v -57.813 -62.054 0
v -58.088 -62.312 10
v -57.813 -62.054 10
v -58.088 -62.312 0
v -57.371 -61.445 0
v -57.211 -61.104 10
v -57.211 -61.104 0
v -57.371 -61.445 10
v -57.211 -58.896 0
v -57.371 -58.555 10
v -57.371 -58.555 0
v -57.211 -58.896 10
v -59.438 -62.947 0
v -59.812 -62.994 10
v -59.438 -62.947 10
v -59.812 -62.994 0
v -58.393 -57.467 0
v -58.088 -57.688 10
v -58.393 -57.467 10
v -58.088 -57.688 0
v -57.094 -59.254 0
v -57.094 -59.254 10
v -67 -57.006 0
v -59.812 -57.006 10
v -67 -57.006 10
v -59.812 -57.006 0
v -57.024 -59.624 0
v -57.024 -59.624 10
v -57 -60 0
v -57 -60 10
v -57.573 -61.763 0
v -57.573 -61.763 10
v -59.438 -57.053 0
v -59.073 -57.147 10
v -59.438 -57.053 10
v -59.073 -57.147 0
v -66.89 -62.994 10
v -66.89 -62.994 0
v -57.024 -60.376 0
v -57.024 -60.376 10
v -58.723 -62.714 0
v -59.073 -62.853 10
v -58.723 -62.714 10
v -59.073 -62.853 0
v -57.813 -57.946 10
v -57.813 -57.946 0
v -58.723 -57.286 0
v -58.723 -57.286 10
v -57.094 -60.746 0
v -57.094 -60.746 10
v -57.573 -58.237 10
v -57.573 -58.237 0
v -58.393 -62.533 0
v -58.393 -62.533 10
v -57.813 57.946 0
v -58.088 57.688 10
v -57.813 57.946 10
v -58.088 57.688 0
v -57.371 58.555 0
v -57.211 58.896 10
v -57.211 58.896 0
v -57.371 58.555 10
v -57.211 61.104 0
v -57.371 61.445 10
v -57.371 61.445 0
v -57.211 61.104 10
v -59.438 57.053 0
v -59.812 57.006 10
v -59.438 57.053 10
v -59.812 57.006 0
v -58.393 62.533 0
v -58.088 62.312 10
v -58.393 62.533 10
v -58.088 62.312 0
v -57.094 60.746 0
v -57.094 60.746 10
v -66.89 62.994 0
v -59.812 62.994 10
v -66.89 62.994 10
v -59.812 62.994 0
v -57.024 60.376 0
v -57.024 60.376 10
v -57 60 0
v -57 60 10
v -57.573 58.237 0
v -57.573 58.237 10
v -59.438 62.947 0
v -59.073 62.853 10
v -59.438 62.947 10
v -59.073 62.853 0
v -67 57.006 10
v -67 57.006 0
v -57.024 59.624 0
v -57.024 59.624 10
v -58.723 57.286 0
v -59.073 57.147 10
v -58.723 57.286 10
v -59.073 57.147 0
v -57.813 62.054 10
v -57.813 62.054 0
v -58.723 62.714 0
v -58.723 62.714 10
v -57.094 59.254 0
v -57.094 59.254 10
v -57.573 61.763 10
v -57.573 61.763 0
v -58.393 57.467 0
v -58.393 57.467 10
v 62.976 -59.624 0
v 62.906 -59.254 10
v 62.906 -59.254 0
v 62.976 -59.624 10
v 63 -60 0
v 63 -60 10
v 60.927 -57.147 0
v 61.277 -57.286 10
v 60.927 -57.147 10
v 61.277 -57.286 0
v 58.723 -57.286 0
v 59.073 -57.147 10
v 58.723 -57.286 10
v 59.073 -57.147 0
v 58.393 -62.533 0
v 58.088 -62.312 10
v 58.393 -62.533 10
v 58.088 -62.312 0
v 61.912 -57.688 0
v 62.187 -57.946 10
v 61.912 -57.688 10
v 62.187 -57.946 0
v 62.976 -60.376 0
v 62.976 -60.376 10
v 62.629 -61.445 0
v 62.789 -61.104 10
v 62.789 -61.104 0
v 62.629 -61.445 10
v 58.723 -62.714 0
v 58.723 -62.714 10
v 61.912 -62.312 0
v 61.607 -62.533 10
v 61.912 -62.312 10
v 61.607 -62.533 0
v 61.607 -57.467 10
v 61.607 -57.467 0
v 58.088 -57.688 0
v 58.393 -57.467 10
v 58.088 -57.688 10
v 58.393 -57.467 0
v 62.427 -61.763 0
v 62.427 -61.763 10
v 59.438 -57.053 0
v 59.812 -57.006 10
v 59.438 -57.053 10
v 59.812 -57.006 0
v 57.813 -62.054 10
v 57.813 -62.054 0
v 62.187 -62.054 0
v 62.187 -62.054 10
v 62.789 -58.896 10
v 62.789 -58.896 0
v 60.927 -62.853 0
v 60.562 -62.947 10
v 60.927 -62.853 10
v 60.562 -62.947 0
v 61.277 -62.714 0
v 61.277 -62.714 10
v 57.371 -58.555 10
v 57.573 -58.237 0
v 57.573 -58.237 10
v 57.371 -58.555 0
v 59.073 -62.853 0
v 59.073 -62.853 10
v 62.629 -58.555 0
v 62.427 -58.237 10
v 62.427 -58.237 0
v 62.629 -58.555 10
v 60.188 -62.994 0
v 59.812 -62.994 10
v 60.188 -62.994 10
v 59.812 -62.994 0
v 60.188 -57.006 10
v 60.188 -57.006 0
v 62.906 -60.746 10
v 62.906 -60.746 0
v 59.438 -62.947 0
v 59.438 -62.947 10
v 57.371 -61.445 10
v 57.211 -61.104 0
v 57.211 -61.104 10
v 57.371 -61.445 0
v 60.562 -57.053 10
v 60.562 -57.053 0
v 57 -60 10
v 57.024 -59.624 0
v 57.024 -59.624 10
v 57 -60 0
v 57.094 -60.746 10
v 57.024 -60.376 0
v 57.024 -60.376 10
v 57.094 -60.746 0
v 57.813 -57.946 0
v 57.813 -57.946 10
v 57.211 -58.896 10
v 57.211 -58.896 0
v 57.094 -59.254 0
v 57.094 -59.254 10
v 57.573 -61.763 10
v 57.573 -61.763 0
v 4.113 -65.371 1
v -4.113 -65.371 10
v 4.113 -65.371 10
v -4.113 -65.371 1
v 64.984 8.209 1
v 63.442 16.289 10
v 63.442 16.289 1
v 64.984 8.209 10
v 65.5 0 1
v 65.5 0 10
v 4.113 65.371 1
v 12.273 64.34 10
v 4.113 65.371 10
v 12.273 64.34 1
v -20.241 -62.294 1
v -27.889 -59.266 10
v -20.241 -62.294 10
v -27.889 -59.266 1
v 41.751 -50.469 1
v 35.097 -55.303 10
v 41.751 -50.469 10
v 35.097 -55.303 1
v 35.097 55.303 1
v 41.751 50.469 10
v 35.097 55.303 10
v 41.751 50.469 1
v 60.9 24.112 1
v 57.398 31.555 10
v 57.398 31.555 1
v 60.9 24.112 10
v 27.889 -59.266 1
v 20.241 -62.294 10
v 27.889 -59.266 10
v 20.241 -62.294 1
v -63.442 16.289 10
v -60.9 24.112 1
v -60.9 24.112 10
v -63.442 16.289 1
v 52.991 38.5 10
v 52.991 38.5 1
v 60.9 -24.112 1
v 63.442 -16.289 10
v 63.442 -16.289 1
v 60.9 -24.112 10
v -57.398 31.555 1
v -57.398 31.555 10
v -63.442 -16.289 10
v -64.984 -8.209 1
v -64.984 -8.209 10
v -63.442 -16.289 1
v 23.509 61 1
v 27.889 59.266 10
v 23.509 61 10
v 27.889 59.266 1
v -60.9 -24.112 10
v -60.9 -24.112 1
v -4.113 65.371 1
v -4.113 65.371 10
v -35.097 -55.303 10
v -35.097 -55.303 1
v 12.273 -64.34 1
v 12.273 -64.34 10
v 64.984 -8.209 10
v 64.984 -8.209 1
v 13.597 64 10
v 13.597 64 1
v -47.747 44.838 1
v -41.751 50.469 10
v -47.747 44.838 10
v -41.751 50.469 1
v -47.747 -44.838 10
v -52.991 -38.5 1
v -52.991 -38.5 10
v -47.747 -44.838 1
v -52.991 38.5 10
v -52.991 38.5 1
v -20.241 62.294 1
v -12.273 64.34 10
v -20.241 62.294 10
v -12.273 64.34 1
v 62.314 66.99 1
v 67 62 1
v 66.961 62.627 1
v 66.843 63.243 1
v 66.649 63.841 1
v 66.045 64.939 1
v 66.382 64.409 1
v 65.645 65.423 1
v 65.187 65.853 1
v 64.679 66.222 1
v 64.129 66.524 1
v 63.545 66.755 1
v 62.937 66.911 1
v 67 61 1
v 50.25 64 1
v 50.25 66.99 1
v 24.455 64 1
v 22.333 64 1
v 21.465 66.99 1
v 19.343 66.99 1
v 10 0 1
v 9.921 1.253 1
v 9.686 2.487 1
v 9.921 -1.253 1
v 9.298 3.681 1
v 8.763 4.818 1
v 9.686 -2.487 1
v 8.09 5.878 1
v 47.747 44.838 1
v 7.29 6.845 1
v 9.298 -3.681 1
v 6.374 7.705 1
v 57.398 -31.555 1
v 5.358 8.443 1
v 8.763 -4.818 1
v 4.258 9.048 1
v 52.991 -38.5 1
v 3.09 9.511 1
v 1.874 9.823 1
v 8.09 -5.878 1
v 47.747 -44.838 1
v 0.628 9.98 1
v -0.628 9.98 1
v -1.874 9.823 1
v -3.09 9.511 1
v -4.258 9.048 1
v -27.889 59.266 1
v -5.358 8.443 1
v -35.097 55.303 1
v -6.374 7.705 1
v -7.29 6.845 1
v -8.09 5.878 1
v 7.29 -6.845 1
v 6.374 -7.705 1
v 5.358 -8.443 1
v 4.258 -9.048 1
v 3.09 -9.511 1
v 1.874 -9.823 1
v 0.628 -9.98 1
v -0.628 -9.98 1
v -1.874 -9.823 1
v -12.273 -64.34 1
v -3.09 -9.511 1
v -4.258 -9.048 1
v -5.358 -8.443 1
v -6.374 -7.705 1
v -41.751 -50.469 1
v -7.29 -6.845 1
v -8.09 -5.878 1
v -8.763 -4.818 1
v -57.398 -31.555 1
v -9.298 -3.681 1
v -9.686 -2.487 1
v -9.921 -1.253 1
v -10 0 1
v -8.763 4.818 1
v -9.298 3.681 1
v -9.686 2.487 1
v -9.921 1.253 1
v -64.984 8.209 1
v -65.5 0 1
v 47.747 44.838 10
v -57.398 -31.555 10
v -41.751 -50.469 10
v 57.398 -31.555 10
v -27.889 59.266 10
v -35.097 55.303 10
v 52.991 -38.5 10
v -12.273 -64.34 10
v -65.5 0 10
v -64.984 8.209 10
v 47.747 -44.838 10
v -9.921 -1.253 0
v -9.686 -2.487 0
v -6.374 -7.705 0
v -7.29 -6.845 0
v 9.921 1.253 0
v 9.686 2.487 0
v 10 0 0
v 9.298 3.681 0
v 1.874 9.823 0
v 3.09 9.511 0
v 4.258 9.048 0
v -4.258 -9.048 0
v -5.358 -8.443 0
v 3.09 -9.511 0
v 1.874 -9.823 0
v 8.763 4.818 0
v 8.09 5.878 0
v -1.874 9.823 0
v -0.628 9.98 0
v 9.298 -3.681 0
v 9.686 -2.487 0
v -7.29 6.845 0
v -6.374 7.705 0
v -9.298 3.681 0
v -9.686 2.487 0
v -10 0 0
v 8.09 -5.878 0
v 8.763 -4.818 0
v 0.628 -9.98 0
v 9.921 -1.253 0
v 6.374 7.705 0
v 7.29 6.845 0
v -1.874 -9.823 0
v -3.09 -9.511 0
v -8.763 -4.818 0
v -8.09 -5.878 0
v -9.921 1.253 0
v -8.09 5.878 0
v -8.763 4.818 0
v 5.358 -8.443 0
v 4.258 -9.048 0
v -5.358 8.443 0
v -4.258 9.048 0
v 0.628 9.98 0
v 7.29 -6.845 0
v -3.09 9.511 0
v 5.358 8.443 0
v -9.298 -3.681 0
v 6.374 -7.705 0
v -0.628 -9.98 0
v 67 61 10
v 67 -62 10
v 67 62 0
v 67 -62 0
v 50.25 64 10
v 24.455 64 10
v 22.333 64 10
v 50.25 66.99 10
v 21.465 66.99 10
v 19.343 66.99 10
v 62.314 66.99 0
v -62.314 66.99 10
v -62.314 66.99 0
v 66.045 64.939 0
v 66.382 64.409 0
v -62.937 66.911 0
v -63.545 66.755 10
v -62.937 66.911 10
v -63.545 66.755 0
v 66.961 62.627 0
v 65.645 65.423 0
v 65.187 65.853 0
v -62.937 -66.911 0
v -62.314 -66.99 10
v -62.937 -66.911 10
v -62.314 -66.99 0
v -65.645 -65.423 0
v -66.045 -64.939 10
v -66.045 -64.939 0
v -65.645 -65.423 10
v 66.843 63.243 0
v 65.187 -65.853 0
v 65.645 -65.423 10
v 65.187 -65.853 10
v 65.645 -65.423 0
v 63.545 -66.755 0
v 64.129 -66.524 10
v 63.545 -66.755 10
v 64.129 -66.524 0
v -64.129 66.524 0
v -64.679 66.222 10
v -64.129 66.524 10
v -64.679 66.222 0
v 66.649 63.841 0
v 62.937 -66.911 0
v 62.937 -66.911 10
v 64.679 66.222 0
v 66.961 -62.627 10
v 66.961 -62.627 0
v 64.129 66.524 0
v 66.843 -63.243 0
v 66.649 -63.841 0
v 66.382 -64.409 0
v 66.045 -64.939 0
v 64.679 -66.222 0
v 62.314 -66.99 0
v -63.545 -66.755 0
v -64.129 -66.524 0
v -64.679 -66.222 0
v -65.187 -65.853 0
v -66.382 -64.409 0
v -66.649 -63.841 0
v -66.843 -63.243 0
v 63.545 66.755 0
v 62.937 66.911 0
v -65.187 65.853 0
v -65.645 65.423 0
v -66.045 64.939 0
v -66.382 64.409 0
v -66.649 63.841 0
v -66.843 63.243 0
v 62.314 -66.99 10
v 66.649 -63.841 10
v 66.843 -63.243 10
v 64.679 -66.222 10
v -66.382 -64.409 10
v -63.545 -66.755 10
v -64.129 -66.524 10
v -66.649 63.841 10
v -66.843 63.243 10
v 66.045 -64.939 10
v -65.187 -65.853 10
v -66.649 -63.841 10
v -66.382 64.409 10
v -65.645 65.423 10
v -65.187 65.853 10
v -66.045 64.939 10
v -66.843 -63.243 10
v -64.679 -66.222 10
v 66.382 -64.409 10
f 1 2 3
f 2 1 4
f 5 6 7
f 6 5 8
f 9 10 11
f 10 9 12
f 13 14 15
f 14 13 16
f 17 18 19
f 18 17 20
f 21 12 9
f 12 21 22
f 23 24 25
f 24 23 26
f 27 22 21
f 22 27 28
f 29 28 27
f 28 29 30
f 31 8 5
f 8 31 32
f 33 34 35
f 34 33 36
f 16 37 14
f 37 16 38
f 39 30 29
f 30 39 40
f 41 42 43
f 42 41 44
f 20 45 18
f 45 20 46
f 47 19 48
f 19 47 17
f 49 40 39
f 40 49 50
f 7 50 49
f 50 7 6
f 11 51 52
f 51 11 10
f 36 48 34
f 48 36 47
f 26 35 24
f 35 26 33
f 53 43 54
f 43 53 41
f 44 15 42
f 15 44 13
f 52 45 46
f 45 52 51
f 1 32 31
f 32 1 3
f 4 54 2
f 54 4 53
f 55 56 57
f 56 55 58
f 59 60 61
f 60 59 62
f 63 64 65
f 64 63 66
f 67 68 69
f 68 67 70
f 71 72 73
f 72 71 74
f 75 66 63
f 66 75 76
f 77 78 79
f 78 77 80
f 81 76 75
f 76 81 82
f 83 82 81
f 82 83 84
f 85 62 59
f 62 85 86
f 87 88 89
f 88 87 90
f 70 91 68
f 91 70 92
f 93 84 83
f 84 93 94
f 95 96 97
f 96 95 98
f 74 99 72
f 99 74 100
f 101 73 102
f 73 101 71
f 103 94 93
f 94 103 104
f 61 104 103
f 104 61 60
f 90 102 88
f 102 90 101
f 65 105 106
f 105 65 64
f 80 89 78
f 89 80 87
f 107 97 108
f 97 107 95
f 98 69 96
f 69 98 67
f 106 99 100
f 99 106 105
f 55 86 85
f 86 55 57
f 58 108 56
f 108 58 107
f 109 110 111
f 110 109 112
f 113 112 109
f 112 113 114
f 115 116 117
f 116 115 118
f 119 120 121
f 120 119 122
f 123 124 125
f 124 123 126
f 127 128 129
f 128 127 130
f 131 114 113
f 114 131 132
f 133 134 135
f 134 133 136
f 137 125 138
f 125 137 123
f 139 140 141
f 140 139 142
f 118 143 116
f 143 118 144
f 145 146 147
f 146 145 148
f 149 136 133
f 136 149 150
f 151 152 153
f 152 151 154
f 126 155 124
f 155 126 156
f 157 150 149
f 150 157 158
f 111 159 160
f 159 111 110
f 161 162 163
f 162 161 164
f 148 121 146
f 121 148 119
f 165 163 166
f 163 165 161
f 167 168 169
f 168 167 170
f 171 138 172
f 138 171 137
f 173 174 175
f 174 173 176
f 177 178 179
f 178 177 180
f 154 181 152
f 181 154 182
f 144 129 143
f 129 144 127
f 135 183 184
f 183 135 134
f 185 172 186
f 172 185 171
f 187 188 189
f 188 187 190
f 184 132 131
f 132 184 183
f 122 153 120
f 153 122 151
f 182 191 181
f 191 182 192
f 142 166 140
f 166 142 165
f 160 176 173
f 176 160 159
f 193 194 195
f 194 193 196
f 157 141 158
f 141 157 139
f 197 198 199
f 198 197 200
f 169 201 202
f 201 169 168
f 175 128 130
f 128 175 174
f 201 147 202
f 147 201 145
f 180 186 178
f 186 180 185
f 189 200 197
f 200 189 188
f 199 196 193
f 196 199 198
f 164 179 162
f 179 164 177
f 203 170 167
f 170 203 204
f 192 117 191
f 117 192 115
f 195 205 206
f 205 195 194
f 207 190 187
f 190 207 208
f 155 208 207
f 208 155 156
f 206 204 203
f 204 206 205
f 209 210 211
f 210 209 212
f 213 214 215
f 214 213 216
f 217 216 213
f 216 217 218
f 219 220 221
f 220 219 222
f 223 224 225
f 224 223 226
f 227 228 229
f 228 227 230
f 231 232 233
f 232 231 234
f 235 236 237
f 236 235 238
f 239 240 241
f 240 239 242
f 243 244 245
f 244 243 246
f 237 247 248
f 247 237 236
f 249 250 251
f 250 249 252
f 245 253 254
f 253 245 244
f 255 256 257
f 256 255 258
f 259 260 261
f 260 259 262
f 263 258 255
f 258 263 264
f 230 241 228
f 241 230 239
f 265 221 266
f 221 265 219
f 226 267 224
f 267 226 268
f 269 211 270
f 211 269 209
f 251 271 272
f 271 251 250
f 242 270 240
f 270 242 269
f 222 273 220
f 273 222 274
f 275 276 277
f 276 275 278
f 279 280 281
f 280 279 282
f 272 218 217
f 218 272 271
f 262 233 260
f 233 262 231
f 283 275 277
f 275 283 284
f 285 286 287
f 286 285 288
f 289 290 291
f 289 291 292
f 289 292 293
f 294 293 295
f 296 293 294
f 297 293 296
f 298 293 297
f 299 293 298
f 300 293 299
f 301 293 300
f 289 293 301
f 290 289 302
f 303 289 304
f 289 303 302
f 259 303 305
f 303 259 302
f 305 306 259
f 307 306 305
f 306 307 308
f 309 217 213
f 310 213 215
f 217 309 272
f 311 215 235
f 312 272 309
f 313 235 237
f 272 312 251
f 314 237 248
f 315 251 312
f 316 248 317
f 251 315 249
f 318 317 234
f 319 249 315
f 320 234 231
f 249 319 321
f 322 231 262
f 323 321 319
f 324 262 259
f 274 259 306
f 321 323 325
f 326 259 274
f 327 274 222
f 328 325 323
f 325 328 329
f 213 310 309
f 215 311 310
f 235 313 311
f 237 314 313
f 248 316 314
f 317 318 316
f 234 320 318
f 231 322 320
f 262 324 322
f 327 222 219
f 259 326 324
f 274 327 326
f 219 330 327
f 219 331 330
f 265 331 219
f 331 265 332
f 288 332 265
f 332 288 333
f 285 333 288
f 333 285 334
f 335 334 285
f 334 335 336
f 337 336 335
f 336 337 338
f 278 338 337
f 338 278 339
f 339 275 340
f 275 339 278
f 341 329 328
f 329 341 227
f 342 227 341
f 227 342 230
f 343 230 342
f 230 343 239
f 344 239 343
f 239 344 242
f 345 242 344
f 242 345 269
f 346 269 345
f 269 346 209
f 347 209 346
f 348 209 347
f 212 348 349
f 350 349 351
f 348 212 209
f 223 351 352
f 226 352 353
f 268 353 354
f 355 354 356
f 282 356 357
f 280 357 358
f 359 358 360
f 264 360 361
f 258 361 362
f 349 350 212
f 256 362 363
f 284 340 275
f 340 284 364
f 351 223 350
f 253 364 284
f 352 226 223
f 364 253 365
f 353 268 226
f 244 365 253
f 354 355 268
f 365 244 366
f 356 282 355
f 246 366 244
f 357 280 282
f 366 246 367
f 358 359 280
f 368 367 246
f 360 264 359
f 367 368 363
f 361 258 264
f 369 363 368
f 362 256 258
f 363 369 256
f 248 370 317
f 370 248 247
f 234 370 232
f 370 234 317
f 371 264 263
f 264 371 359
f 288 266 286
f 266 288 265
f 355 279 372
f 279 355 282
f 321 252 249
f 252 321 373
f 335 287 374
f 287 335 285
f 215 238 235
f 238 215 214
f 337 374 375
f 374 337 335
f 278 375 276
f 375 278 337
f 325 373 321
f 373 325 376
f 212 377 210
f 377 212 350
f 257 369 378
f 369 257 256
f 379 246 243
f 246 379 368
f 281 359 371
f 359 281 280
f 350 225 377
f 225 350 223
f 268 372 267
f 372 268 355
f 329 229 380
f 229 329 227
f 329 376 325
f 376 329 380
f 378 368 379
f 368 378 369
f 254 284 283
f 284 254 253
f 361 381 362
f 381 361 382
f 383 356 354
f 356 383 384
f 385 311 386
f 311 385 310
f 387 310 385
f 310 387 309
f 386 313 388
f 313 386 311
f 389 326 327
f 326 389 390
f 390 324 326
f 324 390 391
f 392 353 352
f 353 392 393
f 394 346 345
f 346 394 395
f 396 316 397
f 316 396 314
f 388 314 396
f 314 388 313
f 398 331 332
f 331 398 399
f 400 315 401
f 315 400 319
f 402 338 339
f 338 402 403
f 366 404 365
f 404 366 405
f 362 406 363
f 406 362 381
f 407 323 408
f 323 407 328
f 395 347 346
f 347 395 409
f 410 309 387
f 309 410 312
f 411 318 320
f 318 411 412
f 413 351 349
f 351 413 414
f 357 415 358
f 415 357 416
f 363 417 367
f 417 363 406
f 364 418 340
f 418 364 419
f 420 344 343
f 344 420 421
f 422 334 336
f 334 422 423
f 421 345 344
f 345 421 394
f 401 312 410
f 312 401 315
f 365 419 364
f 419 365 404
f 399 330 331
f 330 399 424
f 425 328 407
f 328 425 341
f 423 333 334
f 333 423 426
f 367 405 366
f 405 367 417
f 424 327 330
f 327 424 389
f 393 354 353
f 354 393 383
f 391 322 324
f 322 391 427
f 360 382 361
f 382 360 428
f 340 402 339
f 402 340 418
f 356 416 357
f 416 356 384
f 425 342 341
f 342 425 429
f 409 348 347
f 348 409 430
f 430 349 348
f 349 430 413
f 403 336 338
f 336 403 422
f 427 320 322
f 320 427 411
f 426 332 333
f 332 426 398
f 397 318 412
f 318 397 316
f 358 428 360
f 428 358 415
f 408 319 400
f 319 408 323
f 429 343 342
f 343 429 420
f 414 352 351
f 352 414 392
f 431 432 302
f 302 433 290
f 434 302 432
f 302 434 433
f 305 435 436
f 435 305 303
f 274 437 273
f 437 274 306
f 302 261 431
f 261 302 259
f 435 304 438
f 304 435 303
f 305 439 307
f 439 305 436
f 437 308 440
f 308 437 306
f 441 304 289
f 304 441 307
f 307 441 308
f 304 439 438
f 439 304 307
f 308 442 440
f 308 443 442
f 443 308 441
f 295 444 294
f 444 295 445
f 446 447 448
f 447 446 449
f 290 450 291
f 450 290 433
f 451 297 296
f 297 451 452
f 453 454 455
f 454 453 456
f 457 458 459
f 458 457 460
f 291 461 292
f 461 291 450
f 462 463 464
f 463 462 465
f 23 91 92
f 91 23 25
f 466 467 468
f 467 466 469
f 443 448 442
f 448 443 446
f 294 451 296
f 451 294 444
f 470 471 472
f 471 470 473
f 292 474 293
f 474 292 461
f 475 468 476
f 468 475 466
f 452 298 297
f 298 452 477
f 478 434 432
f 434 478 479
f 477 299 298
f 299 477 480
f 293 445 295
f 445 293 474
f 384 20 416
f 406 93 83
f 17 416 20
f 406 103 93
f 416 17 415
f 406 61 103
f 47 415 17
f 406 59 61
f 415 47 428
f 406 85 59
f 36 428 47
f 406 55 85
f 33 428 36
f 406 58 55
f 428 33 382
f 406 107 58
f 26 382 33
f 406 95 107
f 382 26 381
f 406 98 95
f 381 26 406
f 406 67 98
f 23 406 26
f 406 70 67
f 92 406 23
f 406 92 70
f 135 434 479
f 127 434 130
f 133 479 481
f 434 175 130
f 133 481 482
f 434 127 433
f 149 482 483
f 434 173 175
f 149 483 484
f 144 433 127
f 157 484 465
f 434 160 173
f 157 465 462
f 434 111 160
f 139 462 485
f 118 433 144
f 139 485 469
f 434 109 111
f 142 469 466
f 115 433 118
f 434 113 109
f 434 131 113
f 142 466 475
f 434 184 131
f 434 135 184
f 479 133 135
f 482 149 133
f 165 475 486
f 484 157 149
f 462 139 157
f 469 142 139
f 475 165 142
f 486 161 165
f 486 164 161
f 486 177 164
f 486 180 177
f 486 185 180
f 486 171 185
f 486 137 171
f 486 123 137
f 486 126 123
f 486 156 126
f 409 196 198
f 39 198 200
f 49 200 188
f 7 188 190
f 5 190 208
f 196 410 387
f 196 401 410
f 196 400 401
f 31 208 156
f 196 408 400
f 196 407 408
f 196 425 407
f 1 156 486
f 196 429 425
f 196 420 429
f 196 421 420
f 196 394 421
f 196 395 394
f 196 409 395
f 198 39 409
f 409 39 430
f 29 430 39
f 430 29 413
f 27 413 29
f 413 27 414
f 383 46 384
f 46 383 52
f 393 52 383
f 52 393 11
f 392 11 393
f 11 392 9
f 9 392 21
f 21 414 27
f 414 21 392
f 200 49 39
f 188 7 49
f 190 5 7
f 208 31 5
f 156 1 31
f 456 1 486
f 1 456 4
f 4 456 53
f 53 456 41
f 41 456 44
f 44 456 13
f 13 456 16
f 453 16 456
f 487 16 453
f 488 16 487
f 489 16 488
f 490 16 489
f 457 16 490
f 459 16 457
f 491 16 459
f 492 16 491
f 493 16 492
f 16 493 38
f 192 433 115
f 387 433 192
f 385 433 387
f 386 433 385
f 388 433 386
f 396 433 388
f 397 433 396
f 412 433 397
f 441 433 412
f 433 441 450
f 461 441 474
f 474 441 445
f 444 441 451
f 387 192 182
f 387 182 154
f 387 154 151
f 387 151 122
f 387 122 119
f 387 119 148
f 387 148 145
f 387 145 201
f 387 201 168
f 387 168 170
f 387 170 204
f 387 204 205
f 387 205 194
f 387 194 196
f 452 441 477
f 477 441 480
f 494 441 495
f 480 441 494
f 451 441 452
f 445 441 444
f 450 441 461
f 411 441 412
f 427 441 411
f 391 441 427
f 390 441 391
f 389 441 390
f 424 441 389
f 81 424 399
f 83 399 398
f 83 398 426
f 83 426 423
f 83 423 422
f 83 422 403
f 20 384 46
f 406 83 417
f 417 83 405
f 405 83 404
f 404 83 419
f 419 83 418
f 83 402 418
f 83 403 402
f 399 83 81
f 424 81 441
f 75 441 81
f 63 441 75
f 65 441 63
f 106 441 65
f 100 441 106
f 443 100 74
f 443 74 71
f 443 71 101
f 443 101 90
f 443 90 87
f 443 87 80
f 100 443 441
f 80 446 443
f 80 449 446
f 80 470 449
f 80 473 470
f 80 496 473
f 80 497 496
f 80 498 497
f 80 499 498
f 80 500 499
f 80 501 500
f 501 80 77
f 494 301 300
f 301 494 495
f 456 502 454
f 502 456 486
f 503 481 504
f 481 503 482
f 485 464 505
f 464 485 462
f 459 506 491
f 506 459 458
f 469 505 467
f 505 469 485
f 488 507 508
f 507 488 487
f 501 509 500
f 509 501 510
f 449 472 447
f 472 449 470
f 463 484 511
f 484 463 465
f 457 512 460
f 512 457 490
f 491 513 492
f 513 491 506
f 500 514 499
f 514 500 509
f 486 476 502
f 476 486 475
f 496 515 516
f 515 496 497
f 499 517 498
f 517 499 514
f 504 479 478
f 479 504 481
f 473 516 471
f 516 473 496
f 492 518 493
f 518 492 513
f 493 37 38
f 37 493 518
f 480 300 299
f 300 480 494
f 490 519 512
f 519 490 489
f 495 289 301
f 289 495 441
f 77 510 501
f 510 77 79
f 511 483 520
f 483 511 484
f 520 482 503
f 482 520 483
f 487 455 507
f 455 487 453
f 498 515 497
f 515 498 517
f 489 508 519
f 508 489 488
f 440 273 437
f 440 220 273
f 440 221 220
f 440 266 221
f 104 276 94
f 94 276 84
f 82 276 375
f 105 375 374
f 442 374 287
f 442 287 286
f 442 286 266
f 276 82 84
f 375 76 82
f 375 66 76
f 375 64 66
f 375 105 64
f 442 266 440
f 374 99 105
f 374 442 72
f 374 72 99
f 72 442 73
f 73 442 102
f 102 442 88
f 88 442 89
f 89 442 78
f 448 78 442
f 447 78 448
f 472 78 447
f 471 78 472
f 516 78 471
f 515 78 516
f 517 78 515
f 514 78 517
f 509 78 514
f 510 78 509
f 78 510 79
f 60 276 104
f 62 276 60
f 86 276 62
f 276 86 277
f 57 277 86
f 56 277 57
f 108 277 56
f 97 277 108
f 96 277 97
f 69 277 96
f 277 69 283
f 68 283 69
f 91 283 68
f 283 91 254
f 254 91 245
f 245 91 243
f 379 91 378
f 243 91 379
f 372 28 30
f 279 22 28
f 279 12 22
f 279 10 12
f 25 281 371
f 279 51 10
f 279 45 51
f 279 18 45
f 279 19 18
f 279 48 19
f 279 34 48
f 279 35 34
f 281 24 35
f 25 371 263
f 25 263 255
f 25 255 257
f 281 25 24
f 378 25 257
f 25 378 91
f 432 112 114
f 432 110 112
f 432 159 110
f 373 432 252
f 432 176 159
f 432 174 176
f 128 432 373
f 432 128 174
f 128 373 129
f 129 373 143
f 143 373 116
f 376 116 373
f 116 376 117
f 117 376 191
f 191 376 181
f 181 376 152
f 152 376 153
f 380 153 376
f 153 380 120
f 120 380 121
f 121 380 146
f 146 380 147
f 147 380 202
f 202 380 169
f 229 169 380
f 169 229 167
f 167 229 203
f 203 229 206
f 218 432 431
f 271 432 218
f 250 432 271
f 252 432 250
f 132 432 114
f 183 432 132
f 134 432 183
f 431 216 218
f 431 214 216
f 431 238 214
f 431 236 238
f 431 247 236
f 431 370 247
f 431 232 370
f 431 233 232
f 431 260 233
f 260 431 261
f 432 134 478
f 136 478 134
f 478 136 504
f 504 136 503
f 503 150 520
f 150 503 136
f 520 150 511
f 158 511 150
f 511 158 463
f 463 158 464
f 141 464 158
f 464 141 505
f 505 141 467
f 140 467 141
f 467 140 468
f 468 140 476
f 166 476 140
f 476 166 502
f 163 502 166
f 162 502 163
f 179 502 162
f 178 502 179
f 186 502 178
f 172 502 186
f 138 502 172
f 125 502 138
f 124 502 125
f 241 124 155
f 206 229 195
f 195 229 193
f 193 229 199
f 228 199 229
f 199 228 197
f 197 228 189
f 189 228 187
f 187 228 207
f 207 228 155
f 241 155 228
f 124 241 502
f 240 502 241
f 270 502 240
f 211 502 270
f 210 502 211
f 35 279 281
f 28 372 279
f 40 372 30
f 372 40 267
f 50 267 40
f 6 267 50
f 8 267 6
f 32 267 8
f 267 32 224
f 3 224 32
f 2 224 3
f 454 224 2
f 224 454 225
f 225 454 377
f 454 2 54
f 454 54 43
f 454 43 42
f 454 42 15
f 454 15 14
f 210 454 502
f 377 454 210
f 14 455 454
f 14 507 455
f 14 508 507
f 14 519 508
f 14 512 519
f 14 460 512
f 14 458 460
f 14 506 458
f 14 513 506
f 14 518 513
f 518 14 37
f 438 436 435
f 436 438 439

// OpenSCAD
$fn = 50;


difference() {
	union() {
		translate(v = [0, 0, 0]) {
			rotate(a = [0, 0, 0]) {
				hull() {
					translate(v = [-62.0000000000, 62.0000000000, 0]) {
						rotate(a = [0, 0, 0]) {
							translate(v = [0, 0, 0]) {
								rotate(a = [0, 0, 0]) {
									cylinder(h = 10, r = 5);
								}
							}
						}
					}
					translate(v = [62.0000000000, 62.0000000000, 0]) {
						rotate(a = [0, 0, 0]) {
							translate(v = [0, 0, 0]) {
								rotate(a = [0, 0, 0]) {
									cylinder(h = 10, r = 5);
								}
							}
						}
					}
					translate(v = [-62.0000000000, -62.0000000000, 0]) {
						rotate(a = [0, 0, 0]) {
							translate(v = [0, 0, 0]) {
								rotate(a = [0, 0, 0]) {
									cylinder(h = 10, r = 5);
								}
							}
						}
					}
					translate(v = [62.0000000000, -62.0000000000, 0]) {
						rotate(a = [0, 0, 0]) {
							translate(v = [0, 0, 0]) {
								rotate(a = [0, 0, 0]) {
									cylinder(h = 10, r = 5);
								}
							}
						}
					}
				}
			}
		}
	}
	union() {
		translate(v = [-67.5000000000, -60.0000000000, -125]) {
			rotate(a = [0, 0, 0]) {
				hull() {
					translate(v = [7.5000000000, 0, 0]) {
						rotate(a = [0, 0, 0]) {
							translate(v = [0, 0, 0]) {
								rotate(a = [0, 0, 0]) {
									cylinder(h = 250, r = 3.0000000000);
								}
							}
						}
					}
					translate(v = [-7.5000000000, 0, 0]) {
						rotate(a = [0, 0, 0]) {
							translate(v = [0, 0, 0]) {
								rotate(a = [0, 0, 0]) {
									cylinder(h = 250, r = 3.0000000000);
								}
							}
						}
					}
				}
			}
		}
		translate(v = [-67.5000000000, 60.0000000000, -125]) {
			rotate(a = [0, 0, 0]) {
				hull() {
					translate(v = [7.5000000000, 0, 0]) {
						rotate(a = [0, 0, 0]) {
							translate(v = [0, 0, 0]) {
								rotate(a = [0, 0, 0]) {
									cylinder(h = 250, r = 3.0000000000);
								}
							}
						}
					}
					translate(v = [-7.5000000000, 0, 0]) {
						rotate(a = [0, 0, 0]) {
							translate(v = [0, 0, 0]) {
								rotate(a = [0, 0, 0]) {
									cylinder(h = 250, r = 3.0000000000);
								}
							}
						}
					}
				}
			}
		}
		translate(v = [60.0000000000, -60.0000000000, -125.0000000000]) {
			rotate(a = [0, 0, 0]) {
				cylinder(h = 250, r = 3.0000000000);
			}
		}
		translate(v = [0, 0, 1.0000000000]) {
			rotate(a = [0, 0, 0]) {
				cylinder(h = 12, r = 65.5000000000);
			}
		}
		translate(v = [0, 0, -5.0000000000]) {
			rotate(a = [0, 0, 0]) {
				cylinder(h = 10, r = 10.0000000000);
			}
		}
		translate(v = [0.0000000000, 61.0000000000, 1]) {
			rotate(a = [0, 0, 0]) {
				cube(size = [67.0000000000, 3, 12]);
			}
		}
		translate(v = [50.2500000000, 61.0000000000, 1]) {
			rotate(a = [0, 0, 0]) {
				cube(size = [16.7500000000, 6, 12]);
			}
		}
		translate(v = [18.5833333333, 67.7500000000, 1]) {
			rotate(a = [0, 0, -45]) {
				cube(size = [7.5000000000, 1.5000000000, 12]);
			}
		}
	}
}
